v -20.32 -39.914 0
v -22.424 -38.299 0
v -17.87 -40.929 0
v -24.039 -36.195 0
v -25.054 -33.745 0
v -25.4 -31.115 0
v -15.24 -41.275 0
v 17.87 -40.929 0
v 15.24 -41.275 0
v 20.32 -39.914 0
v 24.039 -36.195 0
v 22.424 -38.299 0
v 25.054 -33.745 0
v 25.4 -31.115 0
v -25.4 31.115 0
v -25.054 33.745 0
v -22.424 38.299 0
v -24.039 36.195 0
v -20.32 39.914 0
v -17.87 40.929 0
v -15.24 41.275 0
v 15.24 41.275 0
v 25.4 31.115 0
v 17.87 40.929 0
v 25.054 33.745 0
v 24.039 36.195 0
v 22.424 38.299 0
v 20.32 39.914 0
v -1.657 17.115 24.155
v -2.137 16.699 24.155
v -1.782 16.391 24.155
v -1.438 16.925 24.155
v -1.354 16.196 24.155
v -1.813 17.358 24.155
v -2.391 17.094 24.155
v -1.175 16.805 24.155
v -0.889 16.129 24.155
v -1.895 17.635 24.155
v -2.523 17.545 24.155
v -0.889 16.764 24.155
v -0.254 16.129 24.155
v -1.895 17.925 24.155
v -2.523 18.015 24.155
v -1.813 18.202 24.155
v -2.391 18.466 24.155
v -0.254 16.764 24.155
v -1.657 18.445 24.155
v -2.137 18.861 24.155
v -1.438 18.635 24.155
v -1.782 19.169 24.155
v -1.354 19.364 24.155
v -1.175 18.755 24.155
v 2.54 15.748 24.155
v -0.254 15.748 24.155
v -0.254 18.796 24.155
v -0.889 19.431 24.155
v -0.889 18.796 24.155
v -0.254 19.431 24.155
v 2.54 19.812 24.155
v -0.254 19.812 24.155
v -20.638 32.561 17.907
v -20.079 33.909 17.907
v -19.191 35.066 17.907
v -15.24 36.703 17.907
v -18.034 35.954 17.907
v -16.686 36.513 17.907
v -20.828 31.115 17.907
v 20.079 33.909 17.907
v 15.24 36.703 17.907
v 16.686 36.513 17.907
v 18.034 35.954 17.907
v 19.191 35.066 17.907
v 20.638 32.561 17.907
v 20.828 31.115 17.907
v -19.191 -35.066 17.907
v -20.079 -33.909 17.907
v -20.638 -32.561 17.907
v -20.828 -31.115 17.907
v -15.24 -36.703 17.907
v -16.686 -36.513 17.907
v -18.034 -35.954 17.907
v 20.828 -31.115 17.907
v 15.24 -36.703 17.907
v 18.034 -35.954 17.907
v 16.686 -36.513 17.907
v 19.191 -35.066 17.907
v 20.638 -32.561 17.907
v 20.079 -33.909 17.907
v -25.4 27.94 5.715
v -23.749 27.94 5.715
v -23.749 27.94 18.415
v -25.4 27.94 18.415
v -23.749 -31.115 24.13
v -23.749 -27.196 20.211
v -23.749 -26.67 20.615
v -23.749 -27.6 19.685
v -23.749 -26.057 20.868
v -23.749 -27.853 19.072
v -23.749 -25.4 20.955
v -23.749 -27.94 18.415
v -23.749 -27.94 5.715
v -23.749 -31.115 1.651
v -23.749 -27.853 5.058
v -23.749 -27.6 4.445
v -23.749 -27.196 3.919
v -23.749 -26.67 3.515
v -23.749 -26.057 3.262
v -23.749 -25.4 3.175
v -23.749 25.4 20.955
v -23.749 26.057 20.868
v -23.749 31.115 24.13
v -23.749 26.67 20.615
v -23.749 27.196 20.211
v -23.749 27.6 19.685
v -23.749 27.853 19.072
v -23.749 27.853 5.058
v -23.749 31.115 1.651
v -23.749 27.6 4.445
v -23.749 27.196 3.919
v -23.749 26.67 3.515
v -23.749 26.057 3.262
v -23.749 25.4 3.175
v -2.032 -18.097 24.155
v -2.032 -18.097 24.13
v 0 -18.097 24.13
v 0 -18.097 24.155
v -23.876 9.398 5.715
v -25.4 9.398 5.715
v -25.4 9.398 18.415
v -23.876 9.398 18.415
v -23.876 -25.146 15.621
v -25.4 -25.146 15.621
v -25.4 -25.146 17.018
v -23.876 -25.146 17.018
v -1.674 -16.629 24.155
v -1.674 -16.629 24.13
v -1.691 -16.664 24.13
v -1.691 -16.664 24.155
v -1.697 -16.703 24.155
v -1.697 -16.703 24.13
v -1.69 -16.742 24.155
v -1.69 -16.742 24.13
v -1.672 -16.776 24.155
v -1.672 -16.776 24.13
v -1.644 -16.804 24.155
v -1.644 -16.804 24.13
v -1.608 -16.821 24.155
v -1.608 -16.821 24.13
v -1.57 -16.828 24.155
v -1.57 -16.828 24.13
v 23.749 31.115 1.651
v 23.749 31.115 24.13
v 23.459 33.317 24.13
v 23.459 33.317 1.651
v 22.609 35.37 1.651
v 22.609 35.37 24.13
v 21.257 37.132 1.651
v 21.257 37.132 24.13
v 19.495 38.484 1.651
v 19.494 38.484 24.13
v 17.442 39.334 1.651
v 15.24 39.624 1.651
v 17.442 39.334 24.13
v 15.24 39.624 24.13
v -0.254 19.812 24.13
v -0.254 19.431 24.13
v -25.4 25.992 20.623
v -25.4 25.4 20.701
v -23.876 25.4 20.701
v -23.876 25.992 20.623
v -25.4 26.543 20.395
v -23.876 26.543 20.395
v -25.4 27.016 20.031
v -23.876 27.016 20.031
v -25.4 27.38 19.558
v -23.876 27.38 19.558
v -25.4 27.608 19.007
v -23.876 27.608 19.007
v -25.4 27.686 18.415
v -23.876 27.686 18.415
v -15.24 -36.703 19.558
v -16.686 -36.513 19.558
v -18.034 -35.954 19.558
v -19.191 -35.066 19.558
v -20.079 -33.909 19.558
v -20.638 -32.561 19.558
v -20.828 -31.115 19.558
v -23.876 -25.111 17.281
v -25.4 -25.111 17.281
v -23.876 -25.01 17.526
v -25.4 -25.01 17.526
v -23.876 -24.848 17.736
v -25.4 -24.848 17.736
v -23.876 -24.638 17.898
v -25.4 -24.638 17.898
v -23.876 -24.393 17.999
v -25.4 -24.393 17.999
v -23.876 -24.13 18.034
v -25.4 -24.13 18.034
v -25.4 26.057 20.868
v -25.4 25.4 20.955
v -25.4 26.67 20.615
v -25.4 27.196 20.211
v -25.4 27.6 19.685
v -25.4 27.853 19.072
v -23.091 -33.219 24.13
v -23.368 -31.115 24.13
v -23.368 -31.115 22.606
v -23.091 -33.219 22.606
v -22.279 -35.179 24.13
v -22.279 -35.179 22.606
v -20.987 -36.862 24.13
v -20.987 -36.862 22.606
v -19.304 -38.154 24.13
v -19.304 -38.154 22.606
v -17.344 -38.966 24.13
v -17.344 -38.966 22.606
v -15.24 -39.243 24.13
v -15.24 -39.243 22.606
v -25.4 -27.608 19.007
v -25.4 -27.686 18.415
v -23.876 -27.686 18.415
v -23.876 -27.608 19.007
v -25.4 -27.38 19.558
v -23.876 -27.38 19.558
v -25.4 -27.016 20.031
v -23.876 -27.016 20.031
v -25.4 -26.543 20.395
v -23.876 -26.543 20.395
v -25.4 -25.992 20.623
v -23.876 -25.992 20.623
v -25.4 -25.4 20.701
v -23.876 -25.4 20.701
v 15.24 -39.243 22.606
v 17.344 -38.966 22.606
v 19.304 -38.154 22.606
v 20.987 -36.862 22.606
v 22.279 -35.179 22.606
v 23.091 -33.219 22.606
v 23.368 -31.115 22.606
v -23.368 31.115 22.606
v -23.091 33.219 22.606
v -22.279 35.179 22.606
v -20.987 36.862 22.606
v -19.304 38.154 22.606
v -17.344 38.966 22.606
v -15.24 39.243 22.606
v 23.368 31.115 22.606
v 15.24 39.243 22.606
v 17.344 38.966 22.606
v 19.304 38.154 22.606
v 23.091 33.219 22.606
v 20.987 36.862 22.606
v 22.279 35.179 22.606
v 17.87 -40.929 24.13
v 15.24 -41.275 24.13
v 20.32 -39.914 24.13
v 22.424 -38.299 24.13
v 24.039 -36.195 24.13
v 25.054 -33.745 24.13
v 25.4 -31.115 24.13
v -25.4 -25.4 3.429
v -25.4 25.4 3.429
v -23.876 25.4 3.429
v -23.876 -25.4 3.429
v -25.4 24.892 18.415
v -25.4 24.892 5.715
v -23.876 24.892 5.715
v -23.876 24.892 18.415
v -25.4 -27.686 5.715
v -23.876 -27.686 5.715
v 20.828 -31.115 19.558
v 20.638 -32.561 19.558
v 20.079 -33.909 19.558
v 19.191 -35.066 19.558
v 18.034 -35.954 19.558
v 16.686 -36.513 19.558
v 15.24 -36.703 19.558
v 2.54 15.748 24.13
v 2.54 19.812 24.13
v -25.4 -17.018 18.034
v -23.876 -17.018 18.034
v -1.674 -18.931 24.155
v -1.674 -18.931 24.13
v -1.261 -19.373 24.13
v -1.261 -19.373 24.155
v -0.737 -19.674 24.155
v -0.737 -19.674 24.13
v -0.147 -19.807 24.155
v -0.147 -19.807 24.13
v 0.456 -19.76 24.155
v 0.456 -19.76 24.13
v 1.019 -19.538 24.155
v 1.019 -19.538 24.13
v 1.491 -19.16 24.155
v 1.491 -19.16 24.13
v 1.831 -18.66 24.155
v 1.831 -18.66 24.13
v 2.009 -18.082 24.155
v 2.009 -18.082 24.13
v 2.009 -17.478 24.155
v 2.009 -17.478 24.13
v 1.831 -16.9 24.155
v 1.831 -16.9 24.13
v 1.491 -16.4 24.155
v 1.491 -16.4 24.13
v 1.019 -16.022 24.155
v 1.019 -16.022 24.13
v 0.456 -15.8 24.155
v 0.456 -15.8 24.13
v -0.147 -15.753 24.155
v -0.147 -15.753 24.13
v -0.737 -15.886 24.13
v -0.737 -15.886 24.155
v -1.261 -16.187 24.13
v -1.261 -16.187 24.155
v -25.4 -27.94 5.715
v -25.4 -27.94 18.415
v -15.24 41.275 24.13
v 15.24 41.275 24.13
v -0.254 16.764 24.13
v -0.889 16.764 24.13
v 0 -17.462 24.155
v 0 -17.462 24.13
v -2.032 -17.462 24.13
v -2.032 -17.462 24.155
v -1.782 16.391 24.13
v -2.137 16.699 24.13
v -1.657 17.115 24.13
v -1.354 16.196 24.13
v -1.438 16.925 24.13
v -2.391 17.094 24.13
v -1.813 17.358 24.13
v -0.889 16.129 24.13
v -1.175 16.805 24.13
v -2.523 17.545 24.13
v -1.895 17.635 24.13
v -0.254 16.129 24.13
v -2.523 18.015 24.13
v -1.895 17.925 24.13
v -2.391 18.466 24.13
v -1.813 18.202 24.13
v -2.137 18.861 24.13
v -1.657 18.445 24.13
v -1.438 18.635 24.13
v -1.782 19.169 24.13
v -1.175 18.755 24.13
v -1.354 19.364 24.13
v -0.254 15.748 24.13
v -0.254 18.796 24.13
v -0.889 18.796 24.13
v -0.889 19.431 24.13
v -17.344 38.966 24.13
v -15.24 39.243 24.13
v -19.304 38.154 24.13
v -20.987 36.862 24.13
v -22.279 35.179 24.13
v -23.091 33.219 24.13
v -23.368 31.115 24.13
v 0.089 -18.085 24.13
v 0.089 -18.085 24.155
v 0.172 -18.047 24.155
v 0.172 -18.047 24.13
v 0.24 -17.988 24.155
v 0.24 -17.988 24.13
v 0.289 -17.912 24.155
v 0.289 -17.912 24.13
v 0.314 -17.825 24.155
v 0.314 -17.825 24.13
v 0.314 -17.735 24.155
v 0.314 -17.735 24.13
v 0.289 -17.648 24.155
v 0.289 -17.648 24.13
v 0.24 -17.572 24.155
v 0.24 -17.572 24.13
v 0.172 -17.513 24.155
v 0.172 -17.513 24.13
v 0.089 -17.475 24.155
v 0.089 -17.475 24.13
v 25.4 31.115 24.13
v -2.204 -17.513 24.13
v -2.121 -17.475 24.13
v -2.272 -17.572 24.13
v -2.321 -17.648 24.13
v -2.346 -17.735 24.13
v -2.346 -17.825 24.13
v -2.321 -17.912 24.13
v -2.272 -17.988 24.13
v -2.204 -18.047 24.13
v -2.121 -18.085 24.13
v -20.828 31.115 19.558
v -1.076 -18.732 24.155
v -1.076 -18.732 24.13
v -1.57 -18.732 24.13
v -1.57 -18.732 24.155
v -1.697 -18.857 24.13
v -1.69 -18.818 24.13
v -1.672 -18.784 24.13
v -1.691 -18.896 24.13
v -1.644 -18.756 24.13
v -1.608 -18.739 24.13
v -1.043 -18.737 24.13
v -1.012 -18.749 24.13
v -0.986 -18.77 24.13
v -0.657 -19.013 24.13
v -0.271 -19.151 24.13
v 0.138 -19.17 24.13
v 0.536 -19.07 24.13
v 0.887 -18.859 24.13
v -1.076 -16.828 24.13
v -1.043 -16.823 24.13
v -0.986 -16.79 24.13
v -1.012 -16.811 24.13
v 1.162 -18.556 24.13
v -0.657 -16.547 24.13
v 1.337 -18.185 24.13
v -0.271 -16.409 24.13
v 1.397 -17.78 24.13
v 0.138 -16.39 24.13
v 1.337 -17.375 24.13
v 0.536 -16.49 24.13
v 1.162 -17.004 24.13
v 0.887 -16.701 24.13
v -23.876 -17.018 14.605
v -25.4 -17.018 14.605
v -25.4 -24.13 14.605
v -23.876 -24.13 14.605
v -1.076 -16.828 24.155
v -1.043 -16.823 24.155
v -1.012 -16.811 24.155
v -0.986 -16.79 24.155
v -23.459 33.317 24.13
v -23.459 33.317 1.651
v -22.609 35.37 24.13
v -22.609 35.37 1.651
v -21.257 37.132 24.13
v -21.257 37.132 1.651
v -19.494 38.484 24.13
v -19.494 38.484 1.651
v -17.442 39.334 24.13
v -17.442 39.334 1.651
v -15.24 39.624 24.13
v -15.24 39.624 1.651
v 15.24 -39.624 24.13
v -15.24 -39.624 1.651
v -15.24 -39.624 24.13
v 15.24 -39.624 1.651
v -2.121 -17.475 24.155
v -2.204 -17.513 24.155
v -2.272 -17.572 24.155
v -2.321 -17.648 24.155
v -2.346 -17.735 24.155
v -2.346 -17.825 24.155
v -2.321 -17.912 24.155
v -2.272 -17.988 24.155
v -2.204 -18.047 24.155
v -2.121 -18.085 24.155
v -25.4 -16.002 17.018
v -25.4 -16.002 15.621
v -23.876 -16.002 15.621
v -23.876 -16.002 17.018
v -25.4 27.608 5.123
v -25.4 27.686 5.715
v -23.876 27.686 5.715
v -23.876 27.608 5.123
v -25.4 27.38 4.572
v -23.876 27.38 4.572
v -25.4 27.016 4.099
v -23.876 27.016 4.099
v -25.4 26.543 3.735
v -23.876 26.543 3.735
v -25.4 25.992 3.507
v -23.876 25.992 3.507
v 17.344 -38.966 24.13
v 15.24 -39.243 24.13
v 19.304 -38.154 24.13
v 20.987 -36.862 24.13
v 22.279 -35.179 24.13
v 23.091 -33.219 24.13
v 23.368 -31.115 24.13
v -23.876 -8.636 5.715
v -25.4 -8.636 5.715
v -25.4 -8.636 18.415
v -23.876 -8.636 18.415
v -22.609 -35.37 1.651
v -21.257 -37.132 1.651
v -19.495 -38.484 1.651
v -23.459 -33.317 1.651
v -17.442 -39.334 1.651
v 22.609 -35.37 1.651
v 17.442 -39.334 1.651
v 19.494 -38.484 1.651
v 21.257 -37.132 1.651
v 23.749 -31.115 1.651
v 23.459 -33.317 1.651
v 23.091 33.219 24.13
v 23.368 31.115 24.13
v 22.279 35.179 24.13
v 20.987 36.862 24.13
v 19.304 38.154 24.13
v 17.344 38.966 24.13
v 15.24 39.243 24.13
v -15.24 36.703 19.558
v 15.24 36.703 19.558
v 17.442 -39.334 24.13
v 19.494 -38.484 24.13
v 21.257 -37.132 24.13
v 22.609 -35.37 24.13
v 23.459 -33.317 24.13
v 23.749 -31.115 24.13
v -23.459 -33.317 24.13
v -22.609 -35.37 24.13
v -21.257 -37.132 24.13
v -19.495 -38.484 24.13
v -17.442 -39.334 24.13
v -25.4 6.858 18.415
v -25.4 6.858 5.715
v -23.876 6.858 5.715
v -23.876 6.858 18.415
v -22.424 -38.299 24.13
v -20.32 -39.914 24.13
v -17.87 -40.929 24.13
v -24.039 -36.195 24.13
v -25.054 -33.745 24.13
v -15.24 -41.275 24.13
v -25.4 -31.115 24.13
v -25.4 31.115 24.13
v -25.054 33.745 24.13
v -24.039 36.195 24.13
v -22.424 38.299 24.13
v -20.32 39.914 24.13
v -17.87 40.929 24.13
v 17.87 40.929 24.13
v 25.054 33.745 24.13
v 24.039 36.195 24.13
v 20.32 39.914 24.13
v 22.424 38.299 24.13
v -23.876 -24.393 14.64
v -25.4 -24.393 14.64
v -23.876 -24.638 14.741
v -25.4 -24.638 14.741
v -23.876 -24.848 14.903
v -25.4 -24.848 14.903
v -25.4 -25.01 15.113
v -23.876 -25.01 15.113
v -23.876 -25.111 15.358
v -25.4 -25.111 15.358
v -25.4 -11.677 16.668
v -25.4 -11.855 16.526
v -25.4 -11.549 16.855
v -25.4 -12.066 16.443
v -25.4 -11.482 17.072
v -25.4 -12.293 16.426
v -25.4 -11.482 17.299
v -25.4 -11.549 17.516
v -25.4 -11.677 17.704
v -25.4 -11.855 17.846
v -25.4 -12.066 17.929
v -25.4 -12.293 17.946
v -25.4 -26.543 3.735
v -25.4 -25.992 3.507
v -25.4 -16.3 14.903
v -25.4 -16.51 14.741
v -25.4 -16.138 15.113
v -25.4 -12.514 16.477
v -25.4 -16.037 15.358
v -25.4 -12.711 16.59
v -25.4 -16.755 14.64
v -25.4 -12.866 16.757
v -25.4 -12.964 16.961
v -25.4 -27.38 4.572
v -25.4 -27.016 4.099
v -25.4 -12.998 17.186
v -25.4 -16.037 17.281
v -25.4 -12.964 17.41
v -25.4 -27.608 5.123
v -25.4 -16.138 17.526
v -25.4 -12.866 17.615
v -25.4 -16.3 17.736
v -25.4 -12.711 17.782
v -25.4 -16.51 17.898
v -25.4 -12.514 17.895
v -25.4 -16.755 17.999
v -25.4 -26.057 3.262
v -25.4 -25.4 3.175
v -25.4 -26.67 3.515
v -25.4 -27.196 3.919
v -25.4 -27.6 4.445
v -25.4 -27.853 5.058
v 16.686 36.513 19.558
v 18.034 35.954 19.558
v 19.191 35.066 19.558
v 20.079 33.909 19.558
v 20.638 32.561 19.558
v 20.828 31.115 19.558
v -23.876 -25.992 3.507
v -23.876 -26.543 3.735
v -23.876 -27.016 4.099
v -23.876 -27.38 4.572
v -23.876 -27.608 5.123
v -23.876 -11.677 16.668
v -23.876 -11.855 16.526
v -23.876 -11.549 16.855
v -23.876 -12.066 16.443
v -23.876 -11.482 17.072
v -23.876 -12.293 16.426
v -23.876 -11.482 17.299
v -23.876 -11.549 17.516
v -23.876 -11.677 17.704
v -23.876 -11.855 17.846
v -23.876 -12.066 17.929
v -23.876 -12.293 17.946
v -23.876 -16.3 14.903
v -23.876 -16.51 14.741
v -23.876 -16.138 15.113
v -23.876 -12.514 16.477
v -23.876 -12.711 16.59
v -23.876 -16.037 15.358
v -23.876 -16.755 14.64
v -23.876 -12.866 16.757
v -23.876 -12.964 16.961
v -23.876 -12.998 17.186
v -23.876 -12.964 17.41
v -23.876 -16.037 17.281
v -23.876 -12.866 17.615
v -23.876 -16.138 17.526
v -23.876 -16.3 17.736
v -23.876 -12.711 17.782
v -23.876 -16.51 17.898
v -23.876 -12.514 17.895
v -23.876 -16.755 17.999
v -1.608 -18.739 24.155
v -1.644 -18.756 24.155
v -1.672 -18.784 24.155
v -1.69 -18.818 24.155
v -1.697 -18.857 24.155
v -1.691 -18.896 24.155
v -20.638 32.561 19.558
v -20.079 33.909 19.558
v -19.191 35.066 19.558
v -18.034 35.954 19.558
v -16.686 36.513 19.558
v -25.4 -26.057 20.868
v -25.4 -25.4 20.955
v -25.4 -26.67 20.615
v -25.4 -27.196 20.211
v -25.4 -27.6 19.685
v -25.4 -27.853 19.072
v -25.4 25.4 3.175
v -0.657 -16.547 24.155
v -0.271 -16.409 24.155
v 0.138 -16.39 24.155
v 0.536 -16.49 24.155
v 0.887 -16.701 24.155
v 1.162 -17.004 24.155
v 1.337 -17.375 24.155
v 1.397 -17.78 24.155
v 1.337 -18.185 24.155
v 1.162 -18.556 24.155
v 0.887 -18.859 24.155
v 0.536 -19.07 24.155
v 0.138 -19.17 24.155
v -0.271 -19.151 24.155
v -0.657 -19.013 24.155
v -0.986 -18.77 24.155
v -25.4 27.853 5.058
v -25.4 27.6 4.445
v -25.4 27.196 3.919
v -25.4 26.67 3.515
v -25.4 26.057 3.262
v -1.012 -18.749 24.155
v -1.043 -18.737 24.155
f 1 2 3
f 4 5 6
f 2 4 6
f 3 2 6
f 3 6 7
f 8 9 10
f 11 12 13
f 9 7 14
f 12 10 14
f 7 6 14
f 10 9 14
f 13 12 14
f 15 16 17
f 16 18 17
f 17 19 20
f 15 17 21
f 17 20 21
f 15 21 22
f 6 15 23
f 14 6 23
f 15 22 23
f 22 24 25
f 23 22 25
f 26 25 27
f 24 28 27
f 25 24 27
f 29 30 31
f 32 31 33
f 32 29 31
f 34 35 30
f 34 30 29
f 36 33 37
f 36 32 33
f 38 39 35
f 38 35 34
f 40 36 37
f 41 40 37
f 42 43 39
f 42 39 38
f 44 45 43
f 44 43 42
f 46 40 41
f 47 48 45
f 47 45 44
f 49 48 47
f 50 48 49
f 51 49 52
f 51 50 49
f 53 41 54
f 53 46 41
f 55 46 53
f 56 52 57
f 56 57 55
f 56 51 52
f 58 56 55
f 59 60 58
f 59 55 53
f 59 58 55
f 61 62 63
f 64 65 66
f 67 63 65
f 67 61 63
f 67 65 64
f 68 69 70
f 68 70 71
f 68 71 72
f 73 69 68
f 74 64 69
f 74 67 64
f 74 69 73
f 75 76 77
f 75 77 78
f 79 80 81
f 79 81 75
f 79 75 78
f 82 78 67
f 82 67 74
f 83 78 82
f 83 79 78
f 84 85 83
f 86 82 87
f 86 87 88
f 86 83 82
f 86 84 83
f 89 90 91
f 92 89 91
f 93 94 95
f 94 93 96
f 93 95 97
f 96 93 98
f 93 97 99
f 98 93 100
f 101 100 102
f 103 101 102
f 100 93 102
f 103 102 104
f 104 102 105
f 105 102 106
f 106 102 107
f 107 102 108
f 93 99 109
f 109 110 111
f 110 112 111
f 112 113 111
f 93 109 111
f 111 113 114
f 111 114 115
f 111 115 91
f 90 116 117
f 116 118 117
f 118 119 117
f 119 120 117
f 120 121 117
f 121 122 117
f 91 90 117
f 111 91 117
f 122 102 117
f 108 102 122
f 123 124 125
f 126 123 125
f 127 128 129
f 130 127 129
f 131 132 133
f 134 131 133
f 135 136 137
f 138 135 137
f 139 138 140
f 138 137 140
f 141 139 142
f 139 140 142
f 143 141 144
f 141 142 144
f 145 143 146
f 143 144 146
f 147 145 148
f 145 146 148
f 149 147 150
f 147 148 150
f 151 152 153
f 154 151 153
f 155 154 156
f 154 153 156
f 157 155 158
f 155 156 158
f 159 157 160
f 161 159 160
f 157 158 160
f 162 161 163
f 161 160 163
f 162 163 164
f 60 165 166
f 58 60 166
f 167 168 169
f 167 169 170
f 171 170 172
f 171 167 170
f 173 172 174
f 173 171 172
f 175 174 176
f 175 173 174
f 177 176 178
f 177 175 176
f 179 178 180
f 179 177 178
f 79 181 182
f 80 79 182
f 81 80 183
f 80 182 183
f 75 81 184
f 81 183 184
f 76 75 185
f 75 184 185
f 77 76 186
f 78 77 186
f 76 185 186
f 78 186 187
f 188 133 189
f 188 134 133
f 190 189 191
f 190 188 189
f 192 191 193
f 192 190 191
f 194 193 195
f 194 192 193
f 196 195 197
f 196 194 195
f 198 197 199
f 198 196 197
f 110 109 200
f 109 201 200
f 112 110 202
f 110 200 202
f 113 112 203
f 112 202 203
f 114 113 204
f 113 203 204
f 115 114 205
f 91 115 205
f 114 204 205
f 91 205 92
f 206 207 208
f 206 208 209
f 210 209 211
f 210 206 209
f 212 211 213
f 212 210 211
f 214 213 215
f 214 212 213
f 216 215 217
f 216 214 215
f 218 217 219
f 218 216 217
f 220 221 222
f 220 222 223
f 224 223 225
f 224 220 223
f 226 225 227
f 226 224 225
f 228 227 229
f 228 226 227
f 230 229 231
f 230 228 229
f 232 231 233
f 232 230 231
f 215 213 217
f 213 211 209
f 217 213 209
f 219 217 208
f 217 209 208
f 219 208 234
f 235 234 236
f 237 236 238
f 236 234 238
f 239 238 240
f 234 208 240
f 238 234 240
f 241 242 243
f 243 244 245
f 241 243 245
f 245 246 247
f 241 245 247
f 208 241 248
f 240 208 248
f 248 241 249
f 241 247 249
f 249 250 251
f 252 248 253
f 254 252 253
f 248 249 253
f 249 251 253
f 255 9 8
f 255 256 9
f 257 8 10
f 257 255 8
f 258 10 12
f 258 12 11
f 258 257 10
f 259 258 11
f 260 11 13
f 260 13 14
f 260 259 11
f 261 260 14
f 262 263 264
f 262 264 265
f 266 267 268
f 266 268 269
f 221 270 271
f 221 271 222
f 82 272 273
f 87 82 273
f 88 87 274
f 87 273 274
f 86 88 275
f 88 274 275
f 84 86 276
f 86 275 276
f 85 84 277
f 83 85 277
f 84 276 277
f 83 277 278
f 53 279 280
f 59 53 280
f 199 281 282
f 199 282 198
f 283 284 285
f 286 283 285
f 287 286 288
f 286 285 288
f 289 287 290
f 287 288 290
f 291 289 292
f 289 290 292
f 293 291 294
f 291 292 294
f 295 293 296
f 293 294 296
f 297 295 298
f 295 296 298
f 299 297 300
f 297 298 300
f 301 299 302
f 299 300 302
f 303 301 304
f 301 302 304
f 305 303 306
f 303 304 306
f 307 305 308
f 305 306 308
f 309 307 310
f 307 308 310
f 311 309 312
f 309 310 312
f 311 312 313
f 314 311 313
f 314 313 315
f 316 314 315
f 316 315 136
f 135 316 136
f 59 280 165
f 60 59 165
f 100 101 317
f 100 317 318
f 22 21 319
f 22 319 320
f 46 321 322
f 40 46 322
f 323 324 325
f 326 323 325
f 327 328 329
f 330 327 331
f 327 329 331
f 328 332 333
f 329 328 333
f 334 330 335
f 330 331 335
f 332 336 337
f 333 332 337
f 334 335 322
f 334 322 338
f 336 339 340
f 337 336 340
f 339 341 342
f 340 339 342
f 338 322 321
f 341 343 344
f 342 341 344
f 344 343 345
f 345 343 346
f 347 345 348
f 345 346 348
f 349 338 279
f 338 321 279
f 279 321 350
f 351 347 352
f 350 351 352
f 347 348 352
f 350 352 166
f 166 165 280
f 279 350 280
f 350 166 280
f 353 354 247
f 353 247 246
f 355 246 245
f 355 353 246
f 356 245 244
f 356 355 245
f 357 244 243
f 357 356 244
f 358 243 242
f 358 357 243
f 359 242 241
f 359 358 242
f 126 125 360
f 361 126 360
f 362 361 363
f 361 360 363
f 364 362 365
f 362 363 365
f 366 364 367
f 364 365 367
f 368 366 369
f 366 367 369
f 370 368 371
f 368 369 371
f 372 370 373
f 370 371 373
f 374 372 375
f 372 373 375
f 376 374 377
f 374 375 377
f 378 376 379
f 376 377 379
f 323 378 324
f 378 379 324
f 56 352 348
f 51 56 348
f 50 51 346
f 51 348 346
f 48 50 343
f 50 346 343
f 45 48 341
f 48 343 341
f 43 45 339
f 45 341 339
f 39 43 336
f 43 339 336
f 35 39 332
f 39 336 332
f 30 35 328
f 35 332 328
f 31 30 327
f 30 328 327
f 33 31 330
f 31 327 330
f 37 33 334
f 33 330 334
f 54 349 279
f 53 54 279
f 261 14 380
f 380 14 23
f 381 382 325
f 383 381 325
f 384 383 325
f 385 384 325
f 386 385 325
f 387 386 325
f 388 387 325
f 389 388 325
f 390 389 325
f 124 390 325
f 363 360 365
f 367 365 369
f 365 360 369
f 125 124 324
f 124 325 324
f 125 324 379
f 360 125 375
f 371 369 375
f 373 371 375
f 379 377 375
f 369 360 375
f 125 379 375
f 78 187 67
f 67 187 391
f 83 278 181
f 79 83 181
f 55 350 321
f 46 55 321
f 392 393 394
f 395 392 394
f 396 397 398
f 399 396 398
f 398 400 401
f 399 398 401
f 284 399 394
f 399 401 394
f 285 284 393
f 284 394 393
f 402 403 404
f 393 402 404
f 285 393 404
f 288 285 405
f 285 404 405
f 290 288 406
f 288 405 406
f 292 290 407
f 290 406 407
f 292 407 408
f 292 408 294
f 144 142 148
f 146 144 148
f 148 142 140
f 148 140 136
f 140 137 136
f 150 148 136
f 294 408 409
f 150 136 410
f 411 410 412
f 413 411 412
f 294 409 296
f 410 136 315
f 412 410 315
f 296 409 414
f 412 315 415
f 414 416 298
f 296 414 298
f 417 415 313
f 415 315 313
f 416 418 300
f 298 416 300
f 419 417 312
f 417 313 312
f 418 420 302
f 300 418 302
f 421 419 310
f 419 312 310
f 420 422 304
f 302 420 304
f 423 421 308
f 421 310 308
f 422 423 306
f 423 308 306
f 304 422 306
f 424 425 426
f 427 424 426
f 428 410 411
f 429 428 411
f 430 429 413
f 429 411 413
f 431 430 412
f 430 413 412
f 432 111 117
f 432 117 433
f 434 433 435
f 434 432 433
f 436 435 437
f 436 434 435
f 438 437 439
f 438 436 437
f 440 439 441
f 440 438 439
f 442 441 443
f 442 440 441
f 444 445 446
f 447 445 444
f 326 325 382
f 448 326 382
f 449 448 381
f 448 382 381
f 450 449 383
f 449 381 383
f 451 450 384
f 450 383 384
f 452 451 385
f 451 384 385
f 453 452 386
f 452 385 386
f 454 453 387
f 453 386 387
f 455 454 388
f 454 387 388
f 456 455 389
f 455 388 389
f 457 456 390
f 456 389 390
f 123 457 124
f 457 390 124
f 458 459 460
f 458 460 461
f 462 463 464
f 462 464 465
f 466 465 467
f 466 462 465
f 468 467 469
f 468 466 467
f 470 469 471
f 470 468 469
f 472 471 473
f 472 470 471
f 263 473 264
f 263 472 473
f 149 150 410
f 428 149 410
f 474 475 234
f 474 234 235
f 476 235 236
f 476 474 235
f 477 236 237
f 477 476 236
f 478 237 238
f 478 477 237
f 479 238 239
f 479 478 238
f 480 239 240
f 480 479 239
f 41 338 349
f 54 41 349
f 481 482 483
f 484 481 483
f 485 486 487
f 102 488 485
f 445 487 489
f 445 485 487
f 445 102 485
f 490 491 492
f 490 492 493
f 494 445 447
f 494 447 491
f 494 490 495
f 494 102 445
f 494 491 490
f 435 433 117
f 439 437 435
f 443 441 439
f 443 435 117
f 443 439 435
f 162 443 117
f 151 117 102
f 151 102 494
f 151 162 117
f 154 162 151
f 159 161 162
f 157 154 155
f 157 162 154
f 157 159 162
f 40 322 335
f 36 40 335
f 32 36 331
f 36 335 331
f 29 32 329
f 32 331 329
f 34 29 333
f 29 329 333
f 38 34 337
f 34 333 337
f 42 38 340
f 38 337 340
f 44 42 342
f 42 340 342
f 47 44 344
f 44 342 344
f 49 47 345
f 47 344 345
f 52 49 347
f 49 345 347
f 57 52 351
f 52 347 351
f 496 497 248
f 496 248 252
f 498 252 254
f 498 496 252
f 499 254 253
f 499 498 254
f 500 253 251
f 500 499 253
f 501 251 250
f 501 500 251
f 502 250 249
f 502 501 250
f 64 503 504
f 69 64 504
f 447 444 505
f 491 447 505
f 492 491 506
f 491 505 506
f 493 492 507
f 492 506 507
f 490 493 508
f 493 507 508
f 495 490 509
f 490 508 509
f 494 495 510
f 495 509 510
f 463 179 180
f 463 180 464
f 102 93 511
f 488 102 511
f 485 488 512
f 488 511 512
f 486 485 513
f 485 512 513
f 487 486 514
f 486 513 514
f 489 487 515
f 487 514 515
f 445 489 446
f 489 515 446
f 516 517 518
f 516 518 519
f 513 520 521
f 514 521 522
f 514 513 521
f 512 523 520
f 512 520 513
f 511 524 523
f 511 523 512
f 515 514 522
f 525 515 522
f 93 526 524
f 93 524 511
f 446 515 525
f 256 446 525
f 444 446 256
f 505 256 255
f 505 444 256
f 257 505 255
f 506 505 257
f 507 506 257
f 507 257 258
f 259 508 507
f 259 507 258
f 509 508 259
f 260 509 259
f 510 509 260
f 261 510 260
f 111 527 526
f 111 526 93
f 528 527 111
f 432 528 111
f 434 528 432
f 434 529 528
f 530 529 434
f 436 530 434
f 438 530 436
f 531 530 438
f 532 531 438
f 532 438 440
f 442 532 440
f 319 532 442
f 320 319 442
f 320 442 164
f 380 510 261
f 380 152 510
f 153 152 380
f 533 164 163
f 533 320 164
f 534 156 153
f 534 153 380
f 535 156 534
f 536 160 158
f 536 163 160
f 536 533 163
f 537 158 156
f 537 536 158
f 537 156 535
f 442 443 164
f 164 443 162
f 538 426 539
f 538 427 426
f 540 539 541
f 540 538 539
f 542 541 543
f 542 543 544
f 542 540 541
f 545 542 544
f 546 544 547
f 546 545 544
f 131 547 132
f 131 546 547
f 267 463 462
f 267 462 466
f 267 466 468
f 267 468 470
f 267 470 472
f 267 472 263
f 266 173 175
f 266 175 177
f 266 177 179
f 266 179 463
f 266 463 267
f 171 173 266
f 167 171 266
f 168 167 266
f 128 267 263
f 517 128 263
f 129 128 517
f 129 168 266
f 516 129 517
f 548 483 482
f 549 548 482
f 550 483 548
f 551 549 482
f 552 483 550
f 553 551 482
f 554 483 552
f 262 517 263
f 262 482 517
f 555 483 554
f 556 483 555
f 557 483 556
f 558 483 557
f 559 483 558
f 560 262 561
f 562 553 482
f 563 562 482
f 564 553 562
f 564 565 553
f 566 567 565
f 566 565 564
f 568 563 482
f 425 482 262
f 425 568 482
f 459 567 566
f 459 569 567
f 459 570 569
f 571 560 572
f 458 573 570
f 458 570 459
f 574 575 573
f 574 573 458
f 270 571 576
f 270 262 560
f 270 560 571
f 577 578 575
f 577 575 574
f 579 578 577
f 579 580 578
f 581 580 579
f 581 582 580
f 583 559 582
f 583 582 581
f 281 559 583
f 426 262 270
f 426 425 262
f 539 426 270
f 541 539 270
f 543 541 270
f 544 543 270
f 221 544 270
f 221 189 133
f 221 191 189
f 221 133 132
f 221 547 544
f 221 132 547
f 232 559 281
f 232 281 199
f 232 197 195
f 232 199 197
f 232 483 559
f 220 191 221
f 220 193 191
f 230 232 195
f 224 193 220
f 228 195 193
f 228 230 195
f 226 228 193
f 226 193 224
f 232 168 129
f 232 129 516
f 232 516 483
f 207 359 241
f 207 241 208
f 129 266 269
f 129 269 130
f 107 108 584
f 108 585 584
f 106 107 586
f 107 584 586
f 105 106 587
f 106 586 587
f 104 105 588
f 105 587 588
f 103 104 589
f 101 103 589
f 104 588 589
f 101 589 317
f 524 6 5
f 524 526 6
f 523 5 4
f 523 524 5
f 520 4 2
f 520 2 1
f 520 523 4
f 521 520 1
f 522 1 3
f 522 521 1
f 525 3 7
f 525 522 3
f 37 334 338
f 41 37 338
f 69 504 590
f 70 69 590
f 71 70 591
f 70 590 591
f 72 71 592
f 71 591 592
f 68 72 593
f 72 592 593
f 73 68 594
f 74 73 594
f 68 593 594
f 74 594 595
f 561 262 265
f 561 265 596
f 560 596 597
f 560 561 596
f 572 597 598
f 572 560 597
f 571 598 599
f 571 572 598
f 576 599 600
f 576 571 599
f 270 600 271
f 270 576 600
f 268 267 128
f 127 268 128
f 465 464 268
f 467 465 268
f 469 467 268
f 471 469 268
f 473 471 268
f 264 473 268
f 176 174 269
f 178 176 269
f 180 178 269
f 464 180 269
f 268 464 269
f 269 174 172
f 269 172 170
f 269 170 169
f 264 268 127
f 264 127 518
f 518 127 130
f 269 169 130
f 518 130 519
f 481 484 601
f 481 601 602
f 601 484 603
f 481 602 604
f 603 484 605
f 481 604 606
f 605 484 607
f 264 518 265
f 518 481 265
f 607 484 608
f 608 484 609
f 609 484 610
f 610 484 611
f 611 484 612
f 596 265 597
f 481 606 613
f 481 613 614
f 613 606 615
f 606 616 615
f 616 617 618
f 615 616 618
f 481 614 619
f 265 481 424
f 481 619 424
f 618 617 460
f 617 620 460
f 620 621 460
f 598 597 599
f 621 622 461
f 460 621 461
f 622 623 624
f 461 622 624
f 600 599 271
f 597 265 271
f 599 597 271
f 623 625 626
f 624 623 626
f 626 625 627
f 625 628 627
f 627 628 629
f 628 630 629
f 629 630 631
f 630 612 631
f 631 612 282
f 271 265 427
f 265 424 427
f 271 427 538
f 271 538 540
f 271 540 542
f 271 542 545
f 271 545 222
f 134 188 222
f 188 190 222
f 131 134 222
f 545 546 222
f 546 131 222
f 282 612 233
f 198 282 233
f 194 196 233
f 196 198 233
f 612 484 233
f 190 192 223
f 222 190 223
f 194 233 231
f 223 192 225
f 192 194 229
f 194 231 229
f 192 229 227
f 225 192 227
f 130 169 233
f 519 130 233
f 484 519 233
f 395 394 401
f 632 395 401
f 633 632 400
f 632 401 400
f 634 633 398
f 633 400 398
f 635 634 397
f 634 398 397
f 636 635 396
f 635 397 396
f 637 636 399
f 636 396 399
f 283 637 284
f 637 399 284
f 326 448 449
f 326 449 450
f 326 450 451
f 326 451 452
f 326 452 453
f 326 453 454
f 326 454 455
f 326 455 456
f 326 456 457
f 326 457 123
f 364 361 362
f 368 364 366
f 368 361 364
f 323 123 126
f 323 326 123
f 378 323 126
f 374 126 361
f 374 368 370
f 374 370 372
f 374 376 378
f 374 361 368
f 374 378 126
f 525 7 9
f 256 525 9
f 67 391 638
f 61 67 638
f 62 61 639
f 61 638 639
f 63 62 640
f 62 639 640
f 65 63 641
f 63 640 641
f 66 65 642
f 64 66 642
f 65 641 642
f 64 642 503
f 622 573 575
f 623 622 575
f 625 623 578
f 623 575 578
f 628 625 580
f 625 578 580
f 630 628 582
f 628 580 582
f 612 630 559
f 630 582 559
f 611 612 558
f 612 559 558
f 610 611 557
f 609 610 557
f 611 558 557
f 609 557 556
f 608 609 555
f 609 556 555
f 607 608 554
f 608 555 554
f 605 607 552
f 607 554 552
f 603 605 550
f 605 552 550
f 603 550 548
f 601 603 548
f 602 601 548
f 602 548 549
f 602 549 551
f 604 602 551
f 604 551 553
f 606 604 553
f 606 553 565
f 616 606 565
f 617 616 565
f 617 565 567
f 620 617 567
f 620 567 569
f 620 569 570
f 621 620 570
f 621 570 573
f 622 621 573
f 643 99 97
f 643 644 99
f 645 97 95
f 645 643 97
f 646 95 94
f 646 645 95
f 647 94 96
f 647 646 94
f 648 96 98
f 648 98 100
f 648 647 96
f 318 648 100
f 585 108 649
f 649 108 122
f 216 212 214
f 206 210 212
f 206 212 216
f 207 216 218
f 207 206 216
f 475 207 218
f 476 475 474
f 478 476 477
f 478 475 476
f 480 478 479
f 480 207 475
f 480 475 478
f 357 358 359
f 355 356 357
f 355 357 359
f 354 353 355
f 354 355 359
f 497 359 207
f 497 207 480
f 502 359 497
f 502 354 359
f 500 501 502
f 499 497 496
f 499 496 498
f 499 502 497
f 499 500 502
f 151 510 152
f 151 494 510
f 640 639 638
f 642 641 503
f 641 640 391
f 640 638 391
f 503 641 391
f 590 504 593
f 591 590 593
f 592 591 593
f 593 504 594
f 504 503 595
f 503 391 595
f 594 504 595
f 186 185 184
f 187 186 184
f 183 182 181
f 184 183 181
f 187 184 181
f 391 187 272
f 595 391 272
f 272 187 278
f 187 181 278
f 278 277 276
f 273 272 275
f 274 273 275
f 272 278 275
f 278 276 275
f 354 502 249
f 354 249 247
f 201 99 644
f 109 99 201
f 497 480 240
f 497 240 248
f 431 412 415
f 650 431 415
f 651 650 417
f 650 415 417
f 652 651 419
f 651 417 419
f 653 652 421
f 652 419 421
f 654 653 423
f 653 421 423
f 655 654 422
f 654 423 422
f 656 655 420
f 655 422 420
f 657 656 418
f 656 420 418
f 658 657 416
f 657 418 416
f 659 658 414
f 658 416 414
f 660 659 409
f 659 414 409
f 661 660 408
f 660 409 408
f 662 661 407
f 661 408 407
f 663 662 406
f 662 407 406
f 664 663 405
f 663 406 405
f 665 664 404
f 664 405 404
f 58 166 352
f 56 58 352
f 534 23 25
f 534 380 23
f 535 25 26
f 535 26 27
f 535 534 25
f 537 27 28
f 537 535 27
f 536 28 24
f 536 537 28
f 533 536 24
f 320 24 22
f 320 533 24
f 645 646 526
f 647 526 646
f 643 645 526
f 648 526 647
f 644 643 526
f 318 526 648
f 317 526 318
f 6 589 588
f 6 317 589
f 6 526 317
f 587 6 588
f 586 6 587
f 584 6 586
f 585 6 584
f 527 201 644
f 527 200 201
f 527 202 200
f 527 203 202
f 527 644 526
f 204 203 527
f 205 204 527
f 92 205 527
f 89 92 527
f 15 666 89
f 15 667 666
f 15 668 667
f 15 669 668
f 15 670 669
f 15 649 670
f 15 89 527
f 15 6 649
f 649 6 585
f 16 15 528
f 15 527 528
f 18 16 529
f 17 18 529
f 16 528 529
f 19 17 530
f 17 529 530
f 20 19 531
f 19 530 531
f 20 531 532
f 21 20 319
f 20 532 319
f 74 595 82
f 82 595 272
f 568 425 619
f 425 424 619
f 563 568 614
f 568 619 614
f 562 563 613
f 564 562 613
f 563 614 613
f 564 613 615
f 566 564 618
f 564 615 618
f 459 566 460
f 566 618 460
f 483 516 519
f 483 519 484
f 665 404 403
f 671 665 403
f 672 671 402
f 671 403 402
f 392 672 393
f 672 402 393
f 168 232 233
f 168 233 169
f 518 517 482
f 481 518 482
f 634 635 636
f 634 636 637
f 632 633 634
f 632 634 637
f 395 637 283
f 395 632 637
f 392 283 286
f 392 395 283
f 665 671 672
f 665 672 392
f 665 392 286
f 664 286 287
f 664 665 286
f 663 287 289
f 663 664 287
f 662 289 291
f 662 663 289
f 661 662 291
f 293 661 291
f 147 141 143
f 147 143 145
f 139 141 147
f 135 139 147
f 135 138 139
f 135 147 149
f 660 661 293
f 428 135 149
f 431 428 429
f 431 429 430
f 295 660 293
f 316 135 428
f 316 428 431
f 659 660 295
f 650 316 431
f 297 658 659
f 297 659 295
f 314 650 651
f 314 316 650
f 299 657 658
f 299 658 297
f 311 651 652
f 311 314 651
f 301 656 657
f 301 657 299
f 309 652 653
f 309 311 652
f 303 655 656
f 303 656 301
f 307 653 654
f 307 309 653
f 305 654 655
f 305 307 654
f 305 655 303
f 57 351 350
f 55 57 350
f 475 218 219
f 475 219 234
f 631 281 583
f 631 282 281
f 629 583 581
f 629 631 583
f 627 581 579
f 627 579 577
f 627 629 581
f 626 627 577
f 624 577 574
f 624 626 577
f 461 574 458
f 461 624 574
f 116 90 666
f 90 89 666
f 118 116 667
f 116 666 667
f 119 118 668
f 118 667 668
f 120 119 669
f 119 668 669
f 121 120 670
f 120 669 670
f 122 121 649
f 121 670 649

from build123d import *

# Parameters (mm, degrees)
F0_W      = 50.8
F0_H      = 82.55
F1_DEPTH  = 24.13
F2_R      = 10.16
F3_T      = -1.651
F5_DEPTH  = 6.35
F8_T      = -1.524
F14_DEPTH = 1.651
F16_DEPTH = 0.0254
F18_DEPTH = 0.0254
F19_W     = 55.88
F19_H     = 17.78
F20_DEPTH = 25.401
F21_R     = 2.54
F23_DEPTH = 1.524
F24_W     = 15.494
F24_H     = 12.7
F24_W_2   = 9.144
F24_H_2   = 3.429
F24_R     = 0.762
F25_DEPTH = 50.801
F26_R     = 1.016


with BuildPart() as f1:
    # F0 (on Top) → F1 (new body)
    with BuildSketch(Plane.XY):
        Rectangle(F0_W, F0_H)
    extrude(amount=F1_DEPTH)

    # F2
    f2_edges = [f1.edges().sort_by_distance(p)[0] for p in [
        (25.4, -41.275, 12.065),
        (-25.4, -41.275, 12.065),
        (25.4, 41.275, 12.065),
        (-25.4, 41.275, 12.065),
    ]]
    fillet(f2_edges, radius=F2_R)

    # F3
    f3_openings = [f1.faces().sort_by_distance(p)[0] for p in [
        (0, 0, 24.13),
    ]]
    offset(amount=F3_T, openings=f3_openings)

    # F19 (on Right) → F20 (cut, through all)
    with BuildSketch(Plane.YZ):
        with Locations((0, 12.065)):
            Rectangle(F19_W, F19_H)
    extrude(amount=-F20_DEPTH, mode=Mode.SUBTRACT)

    # F21
    f21_edges = [f1.edges().sort_by_distance(p)[0] for p in [
        (-24.5745, 27.94, 20.955),
        (-24.5745, -27.94, 20.955),
        (-24.5745, -27.94, 3.175),
        (-24.5745, 27.94, 3.175),
    ]]
    fillet(f21_edges, radius=F21_R)


with BuildPart() as f5:
    # F4 (on face) → F5 (new body)
    with BuildSketch(Plane.XY.offset(24.13)):
        with BuildLine():
            Line((15.24, 39.243), (-15.24, 39.243))
            ThreePointArc((-15.24, 39.243), (-20.9873639175, 36.8623639175), (-23.368, 31.115))
            Line((-23.368, 31.115), (-23.368, -31.115))
            ThreePointArc((-23.368, -31.115), (-20.9873639175, -36.8623639175), (-15.24, -39.243))
            Line((-15.24, -39.243), (15.24, -39.243))
            ThreePointArc((15.24, -39.243), (20.9873639175, -36.8623639175), (23.368, -31.115))
            Line((23.368, -31.115), (23.368, 31.115))
            ThreePointArc((23.368, 31.115), (20.9873639175, 36.8623639175), (15.24, 39.243))
        make_face()
    extrude(amount=-F5_DEPTH)

    # F8
    f8_openings = [f5.faces().sort_by_distance(p)[0] for p in [
        (0, 0, 17.78),
        (0, -39.243, 20.955),
        (20.987364, -36.862364, 20.955),
        (-20.987364, -36.862364, 20.955),
        (23.368, 0, 20.955),
        (20.987364, 36.862364, 20.955),
        (0, 39.243, 20.955),
        (-20.987364, 36.862364, 20.955),
        (-23.368, 0, 20.955),
    ]]
    offset(amount=F8_T, openings=f8_openings)


with BuildPart() as f14:
    # F13 (on offset) → F14 (new body)
    with BuildSketch(Plane(origin=(0, 0, 19.558), x_dir=(1, 0, 0), z_dir=(0, 0, -1))):
        with BuildLine():
            Line((-20.828, 31.115), (-20.828, -31.115))
            ThreePointArc((-20.828, -31.115), (-19.1913126933, -35.0663126933), (-15.24, -36.703))
            Line((-15.24, -36.703), (15.24, -36.703))
            ThreePointArc((15.24, -36.703), (19.1913126933, -35.0663126933), (20.828, -31.115))
            Line((20.828, -31.115), (20.828, 31.115))
            ThreePointArc((20.828, 31.115), (19.1913126933, 35.0663126933), (15.24, 36.703))
            Line((15.24, 36.703), (-15.24, 36.703))
            ThreePointArc((-15.24, 36.703), (-19.1913126933, 35.0663126933), (-20.828, 31.115))
        make_face()
    extrude(amount=F14_DEPTH)


with BuildPart() as f16:
    # F15 (on face) → F16 (new body)
    with BuildSketch(Plane.XY.offset(24.13)):
        with BuildLine():
            ThreePointArc((-2.032, -18.0975), (-2.0195881687, -18.0972573032), (-2.0071953125, -18.0965295839))
            ThreePointArc((-2.0071953125, -18.0965295839), (-2.0071187349, -18.0970148012), (-2.0070420399, -18.0975))
            Line((-2.0070420399, -18.0975), (0, -18.0975))
            ThreePointArc((0, -18.0975), (0.3175, -17.78), (0, -17.4625))
            Line((0, -17.4625), (-2.0070420399, -17.4625))
            ThreePointArc((-2.0070420399, -17.4625), (-2.0071187349, -17.4629851988), (-2.0071953125, -17.4634704161))
            ThreePointArc((-2.0071953125, -17.4634704161), (-2.0195881687, -17.4627426968), (-2.032, -17.4625))
            ThreePointArc((-2.032, -17.4625), (-2.3495, -17.78), (-2.032, -18.0975))
        make_face()
        with BuildLine():
            ThreePointArc((-2.0070420399, -18.0975), (-2.0071187349, -18.0970148012), (-2.0071953125, -18.0965295839))
            ThreePointArc((-2.0071953125, -18.0965295839), (-2.0195881687, -18.0972573032), (-2.032, -18.0975))
            Line((-2.032, -18.0975), (-2.0070420399, -18.0975))
        make_face()
        with BuildLine():
            Line((-2.0070420399, -17.4625), (-2.032, -17.4625))
            ThreePointArc((-2.032, -17.4625), (-2.0195881687, -17.4627426968), (-2.0071953125, -17.4634704161))
            ThreePointArc((-2.0071953125, -17.4634704161), (-2.0071187349, -17.4629851988), (-2.0070420399, -17.4625))
        make_face()
    extrude(amount=F16_DEPTH)


with BuildPart() as f16b:
    # F15 (on face) → F16, piece 2 (new body)
    with BuildSketch(Plane.XY.offset(24.13)):
        with BuildLine():
            ThreePointArc((-0.9861117026, -16.7904583333), (1.397, -17.78), (-0.9861117026, -18.7695416667))
            ThreePointArc((-0.9861117026, -18.7695416667), (-1.0272592949, -18.7421251553), (-1.075758221, -18.7325))
            Line((-1.075758221, -18.7325), (-1.569619301, -18.7325))
            ThreePointArc((-1.569619301, -18.7325), (-1.6820220738, -18.8003847171), (-1.6742605877, -18.9314666667))
            ThreePointArc((-1.6742605877, -18.9314666667), (2.032, -17.78), (-1.6742605877, -16.6285333333))
            ThreePointArc((-1.6742605877, -16.6285333333), (-1.6820220738, -16.7596152829), (-1.569619301, -16.8275))
            Line((-1.569619301, -16.8275), (-1.075758221, -16.8275))
            ThreePointArc((-1.075758221, -16.8275), (-1.0272592949, -16.8178748447), (-0.9861117026, -16.7904583333))
        make_face()
    extrude(amount=F16_DEPTH)


with BuildPart() as f18:
    # F17 (on face) → F18 (new body)
    with BuildSketch(Plane.XY.offset(24.13)):
        with BuildLine():
            Line((2.54, 15.748), (2.54, 19.812))
            Line((2.54, 19.812), (-0.254, 19.812))
            Line((-0.254, 19.812), (-0.254, 19.431))
            Line((-0.254, 19.431), (-0.889, 19.431))
            ThreePointArc((-0.889, 19.431), (-2.54, 17.78), (-0.889, 16.129))
            Line((-0.889, 16.129), (-0.254, 16.129))
            Line((-0.254, 16.129), (-0.254, 15.748))
            Line((-0.254, 15.748), (2.54, 15.748))
        make_face()
        with BuildLine():
            ThreePointArc((-0.889, 16.764), (-1.905, 17.78), (-0.889, 18.796))
            Line((-0.889, 18.796), (-0.254, 18.796))
            Line((-0.254, 18.796), (-0.254, 16.764))
            Line((-0.254, 16.764), (-0.889, 16.764))
        make_face(mode=Mode.SUBTRACT)
    extrude(amount=F18_DEPTH)


with BuildPart() as f23:
    # F22 (on face) → F23 (new body)
    with BuildSketch(Plane(origin=(-25.4, 0, 0), x_dir=(0, -1, 0), z_dir=(-1, 0, 0))):
        with BuildLine():
            ThreePointArc((25.4, 3.429), (27.0164461018, 4.0985538982), (27.686, 5.715))
            Line((27.686, 5.715), (27.686, 18.415))
            ThreePointArc((27.686, 18.415), (27.0164461018, 20.0314461018), (25.4, 20.701))
            Line((25.4, 20.701), (-25.4, 20.701))
            ThreePointArc((-25.4, 20.701), (-27.0164461018, 20.0314461018), (-27.686, 18.415))
            Line((-27.686, 18.415), (-27.686, 5.715))
            ThreePointArc((-27.686, 5.715), (-27.0164461018, 4.0985538982), (-25.4, 3.429))
            Line((-25.4, 3.429), (25.4, 3.429))
        make_face()
    extrude(amount=-F23_DEPTH)

    # F24 (on face) → F25 (cut, through all)
    with BuildSketch(Plane(origin=(-25.4, 0, 0), x_dir=(0, -1, 0), z_dir=(-1, 0, 0))):
        with Locations((-17.145, 12.065)):
            Rectangle(F24_W, F24_H)
        with Locations((0.889, 12.065)):
            Rectangle(F24_W, F24_H)
        with Locations((20.574, 16.3195)):
            Rectangle(F24_W_2, F24_H_2)
        with Locations((12.235950573, 17.1858270001)):
            Circle(F24_R)
    extrude(amount=-F25_DEPTH, mode=Mode.SUBTRACT)

    # F26
    f26_edges = [f23.edges().sort_by_distance(p)[0] for p in [
        (-24.638, -16.002, 18.034),
        (-24.638, -25.146, 18.034),
        (-24.638, -16.002, 14.605),
        (-24.638, -25.146, 14.605),
    ]]
    fillet(f26_edges, radius=F26_R)


solid = Compound([f1.part, f5.part, f14.part, f16.part, f16b.part, f18.part, f23.part])
